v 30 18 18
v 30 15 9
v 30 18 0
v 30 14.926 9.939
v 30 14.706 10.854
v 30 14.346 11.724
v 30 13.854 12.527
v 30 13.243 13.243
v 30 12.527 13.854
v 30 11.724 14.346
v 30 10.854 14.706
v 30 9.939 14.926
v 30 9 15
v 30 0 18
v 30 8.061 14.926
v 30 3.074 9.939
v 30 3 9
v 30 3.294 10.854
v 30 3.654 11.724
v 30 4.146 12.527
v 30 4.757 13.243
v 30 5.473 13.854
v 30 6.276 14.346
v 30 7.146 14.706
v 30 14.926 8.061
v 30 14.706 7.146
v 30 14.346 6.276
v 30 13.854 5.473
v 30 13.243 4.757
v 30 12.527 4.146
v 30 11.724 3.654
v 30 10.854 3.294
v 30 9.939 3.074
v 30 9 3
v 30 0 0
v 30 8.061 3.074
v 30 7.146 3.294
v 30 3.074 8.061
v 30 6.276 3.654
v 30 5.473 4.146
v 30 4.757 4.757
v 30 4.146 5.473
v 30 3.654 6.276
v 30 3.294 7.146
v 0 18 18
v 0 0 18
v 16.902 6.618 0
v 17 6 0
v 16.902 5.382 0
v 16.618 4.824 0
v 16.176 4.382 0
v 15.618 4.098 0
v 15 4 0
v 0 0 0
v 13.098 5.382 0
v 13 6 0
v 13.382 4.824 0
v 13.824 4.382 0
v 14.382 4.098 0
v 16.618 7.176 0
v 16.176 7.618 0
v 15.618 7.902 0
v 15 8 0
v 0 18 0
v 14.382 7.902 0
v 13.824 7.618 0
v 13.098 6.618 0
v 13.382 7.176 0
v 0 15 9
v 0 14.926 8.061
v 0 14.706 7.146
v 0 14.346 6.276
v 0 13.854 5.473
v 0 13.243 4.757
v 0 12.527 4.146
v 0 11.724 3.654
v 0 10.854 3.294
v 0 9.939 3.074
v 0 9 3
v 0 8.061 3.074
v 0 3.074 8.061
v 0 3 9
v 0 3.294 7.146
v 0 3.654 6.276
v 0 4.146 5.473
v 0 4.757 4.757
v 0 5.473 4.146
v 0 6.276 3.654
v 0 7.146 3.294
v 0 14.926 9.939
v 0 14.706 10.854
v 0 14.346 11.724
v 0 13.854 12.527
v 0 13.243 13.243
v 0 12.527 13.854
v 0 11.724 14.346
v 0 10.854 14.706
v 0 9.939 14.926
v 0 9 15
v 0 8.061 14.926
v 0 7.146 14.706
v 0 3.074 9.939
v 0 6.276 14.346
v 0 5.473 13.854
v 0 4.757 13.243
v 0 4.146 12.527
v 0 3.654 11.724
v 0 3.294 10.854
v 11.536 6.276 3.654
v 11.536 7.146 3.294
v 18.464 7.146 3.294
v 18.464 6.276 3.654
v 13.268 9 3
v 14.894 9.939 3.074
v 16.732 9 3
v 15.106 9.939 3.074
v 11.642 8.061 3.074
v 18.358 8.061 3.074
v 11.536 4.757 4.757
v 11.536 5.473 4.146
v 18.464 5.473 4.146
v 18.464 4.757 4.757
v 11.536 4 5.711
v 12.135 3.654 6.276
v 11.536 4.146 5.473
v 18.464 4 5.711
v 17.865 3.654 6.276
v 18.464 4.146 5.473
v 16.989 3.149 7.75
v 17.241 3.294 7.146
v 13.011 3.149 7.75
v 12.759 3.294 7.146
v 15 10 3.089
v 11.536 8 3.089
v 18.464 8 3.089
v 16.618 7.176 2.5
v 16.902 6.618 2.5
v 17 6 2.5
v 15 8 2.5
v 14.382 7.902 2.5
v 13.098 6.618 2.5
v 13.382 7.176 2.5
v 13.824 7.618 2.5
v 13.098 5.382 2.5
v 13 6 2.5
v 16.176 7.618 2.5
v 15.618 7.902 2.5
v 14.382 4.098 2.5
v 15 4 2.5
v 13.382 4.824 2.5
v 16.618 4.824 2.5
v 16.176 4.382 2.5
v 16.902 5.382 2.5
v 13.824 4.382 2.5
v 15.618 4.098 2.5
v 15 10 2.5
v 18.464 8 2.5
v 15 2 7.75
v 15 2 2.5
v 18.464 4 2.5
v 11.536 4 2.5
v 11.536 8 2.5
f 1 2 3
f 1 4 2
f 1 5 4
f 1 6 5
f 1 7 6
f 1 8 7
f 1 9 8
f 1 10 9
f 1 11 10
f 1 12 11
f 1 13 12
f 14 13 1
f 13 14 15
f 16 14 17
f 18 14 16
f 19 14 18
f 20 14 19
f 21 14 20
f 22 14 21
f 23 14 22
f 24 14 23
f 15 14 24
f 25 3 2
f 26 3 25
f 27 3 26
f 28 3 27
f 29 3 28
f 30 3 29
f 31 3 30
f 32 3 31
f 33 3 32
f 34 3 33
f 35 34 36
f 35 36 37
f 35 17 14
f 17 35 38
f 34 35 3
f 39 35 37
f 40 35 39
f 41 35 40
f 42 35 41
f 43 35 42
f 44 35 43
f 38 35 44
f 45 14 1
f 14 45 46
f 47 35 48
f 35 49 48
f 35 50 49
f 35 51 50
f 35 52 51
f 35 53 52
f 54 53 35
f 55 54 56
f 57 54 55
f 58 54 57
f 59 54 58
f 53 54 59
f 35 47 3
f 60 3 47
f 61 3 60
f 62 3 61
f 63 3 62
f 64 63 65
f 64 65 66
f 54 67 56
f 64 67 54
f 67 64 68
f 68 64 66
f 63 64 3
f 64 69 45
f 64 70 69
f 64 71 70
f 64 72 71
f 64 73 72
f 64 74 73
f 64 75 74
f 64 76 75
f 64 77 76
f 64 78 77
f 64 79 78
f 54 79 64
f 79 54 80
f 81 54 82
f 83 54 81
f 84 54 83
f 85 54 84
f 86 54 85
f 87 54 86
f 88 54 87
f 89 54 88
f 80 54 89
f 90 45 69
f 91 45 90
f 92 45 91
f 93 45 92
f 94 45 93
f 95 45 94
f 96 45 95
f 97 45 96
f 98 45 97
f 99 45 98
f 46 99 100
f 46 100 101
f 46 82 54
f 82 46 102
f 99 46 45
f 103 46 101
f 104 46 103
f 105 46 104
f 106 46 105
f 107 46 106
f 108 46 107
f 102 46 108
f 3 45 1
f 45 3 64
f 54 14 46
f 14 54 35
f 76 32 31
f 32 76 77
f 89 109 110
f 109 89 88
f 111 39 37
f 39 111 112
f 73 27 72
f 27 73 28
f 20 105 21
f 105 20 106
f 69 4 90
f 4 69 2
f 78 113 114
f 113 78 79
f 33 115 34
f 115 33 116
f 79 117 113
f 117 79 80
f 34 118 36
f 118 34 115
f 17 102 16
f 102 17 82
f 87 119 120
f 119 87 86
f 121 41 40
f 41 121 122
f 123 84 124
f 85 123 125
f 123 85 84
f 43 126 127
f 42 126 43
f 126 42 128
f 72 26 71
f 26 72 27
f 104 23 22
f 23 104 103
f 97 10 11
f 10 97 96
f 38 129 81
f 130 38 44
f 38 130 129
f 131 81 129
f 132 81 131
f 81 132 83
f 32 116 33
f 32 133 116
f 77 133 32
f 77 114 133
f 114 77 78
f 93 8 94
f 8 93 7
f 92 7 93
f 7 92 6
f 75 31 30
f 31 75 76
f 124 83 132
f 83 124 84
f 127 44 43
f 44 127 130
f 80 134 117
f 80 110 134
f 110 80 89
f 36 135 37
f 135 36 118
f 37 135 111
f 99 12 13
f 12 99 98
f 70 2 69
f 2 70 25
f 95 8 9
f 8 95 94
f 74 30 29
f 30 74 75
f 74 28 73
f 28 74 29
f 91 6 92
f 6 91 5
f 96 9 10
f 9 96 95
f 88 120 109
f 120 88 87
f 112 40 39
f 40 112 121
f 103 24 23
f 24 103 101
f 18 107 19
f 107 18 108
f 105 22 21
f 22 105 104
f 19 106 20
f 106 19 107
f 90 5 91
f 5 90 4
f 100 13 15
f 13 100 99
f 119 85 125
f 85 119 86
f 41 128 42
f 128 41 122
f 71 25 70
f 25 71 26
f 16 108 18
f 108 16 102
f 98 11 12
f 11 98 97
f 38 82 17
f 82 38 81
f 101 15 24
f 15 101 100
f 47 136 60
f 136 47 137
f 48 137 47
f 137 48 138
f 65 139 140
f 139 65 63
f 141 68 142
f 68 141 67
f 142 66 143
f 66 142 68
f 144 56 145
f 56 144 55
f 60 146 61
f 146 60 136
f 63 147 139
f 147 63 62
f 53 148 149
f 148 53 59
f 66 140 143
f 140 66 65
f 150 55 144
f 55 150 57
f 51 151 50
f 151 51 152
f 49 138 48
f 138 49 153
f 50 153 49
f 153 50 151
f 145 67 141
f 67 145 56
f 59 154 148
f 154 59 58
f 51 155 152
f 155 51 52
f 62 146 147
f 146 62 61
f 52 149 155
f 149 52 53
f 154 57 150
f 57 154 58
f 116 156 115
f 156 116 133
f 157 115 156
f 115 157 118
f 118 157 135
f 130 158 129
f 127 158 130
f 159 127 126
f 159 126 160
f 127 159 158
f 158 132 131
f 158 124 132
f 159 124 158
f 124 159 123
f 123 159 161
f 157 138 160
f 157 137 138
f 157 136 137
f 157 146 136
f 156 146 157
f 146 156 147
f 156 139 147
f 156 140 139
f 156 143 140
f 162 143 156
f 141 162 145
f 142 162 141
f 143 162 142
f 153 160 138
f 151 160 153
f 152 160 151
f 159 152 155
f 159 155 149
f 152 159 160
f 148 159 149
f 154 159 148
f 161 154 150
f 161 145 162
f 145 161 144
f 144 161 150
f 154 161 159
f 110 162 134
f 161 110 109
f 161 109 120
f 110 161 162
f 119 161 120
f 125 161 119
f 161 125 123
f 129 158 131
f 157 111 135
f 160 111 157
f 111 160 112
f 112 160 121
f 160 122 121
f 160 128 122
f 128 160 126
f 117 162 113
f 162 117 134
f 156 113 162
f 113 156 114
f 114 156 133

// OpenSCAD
// file: params_basic_components.scad
// Author: Mihai Oltean, www.tcreate.org, mihai.oltean@gmail.com
// More details: jenny5.org
// Source: github.com/jenny5-robot
// MIT License
//--------------------------------------------------------------

spring_length = 20;

smooth_rod_8_radius = 4;
smooth_rod_10_radius = 5;
smooth_rod_12_radius = 6;

tolerance = 0.1;
display_tolerance = 1;

overlap_tolerance = 0.01;

wall_thick_1 = 1;
wall_thick_2 = 2;
wall_thick_3 = 3;
wall_thick_4 = 4;
wall_thick_5 = 5;
wall_thick_5_5 = 5.5;
wall_thick_6 = 6;
wall_thick_7 = 7;
wall_thick_8 = 8;
wall_thick_9 = 9;
wall_thick_10 = 10;
wall_thick_12 = 10;

tolerance_z = [0, 0, tolerance];
tolerance_x = [tolerance, 0, 0];
tolerance_y = [0, tolerance, 0];

display_tolerance_z = [0, 0, display_tolerance];
display_tolerance_x = [display_tolerance, 0, 0];
display_tolerance_y = [0, display_tolerance, 0];

display_tolerance_xz = [display_tolerance, 0, display_tolerance];
display_tolerance_xy = [display_tolerance, display_tolerance, 0];
display_tolerance_yz = [0, display_tolerance, display_tolerance];

display_tolerance_xyz = [display_tolerance, display_tolerance, display_tolerance];
// file: params_screws_nuts_washers.scad
// Author: Mihai Oltean, www.tcreate.org, mihai.oltean@gmail.com
// More details: jenny5.org
// Source: github.com/jenny5-robot
// MIT License
//--------------------------------------------------------------


m2_screw_radius = 1;
m2_nut_radius = 2.2;
m2_nut_height = 1.6;
m2_nut_thick = m2_nut_height;

m3_screw_radius = 1.5;
m3_nut_radius = 3.1;
m3_nut_height = 2.3;
m3_nut_thick = m3_nut_height;
m3_autolock_nut_thick = 4.2;

m4_screw_radius = 2;
m4_nut_radius = 4;
m4_auto_lock_nut_height = 5;
m4_nut_height = 3.25;
m4_nut_thick = 3.25;

m5_screw_radius = 2.5;
m5_nut_radius = 4.6;
m5_nut_height = 4;

m6_screw_radius = 3;
m6_nut_radius = 5.65;
m6_nut_thick = 5;
m6_nut_slim_thick = 3;
m6_autolock_nut_thick = 6;
m6_long_nut_thick = 9;

m8_screw_head_height = 5.7;
m8_screw_radius = 3.9;
m8_nut_small_width = 12.8;
m8_nut_radius = 7.3;
m8_slim_nut_small_width = 12.4;
m8_nut_thick = 6.5;
m8_nut_height = m8_nut_thick;
m8_slim_nut_height = 5.5;
m8_screw_head_radius = 6.5;
m8_autolock_nut_thick = 8;

m10_screw_radius = 5;
m10_nut_thick = 8;
m10_nut_radius = 9.8;

M12_screw_radius = 6;
M12_nut_thick = 10;
M12_nut_radius = 11;
M12_long_long_nut_thick = 36;
M12_long_nut_thick = 36;
M12_autolock_nut_thick = 14;

m10_long_nut_radius = 9.71;
m10_long_nut_height = 29.8;

m10_long_thick_nut_radius = 7.41;
m10_long_thick_nut_height = 30.4;

m12_plastic_nut_radius = 10.45;
m12_plastic_nut_height = 23.3;

tr12_3_nut_radius = 11;
tr12_3_nut_height = 18.1;

washer_5 = 0.97;

washer_4_12_radius = 6;
washer_4_12_external_radius = 6;
washer_4_12_thick = 1;
washer_4_thick = 1;
washer_4_12_internal_radius = 2.15;

washer_4_9_external_radius = 4.5;
washer_4_9_internal_radius = 2.15;
washer_4_9_thick = 1;

washer_6_thick = 1.7;
washer_8_thick = 1.5;
washer_5_thick = 1;

washer_10_height = 2;
washer_10_thick = 2;

washer_12_thick = 2;

washer_5_15_external_radius = 7.5;
washer_5_15_thick = 1;
washer_5_thick = 1;
washer_5_15_internal_radius = 2.65;
// main file
// Author: Mihai Oltean, www.tcreate.org, mihai.oltean@gmail.com
// More details: jenny5.org
// Source: github.com/jenny5-robot
// MIT License
//--------------------------------------------------------------

include <params_screws_nuts_washers.scad>
include <params_basic_components.scad>


//---------------------------------------------------------------------------
module potentiometer_support(length, width, height, dist_to_hole = 10, hole_tolerance = 5, wall_thick = 2)
{
  difference(){
    cube([length, width, height]);
      
    translate ([2, wall_thick, 2])  cube([length, width - 2 * wall_thick, height + 1]);
    //translate ([wall_thick, wall_thick, -1])  cube([length, width - 2 * wall_thick, bottom_wall + 1]);
    translate ([2, 0, height] - display_tolerance_y)  rotate ([0, atan((height - 2) / (length - wall_thick)), 0]) cube([length + sqrt(length), width + 2 * display_tolerance, height + 1]);
    
      // potentiometer hole
    hull(){
       translate ([2 + dist_to_hole, width / 2, 0] - display_tolerance_z) cylinder (h = 5, r = 4.9, $fn = 40);
       translate ([2 + dist_to_hole + hole_tolerance, width / 2, 0] - display_tolerance_z) cylinder (h = 5, r = 4.9, $fn = 40);
    }
  }
}
//---------------------------------------------------------------------------
module potentiometer_support_squared(length, width, height, dist_to_hole = 8, hole_tolerance = 5, wall_thick = 2, pot_width = 16, stopper_shift = 0.9)
{
  difference(){
    union(){
      difference(){
        cube([length, width, height]);
        translate ([2, wall_thick, 2])  cube([length, width - 2 * wall_thick, height + 1]);
        translate ([2, 0, height] - display_tolerance_y)  rotate ([0, atan((height - 2) / (length - wall_thick)), 0]) cube([length + sqrt(length), width + 2 * display_tolerance, height + 1]);
      }
        // stopper for potentiometer
      translate ([0, width / 2 - pot_width / 2 - 2 - stopper_shift, 0]) cube([length, pot_width + 4, 4]);
    }
    // potentiometer slide hole
    translate ([2, width / 2 - pot_width / 2 - stopper_shift, 2]) cube([length, pot_width, height]);
      // potentiometer screw hole
    hull(){
       translate ([2 + dist_to_hole, width / 2, 0] - display_tolerance_z) cylinder (h = 5, r = 5, $fn = 40);
       translate ([2 + dist_to_hole + hole_tolerance, width / 2, 0] - display_tolerance_z) cylinder (h = 5, r = 5, $fn = 40);
    }
  }
}
//---------------------------------------------------------------------------
module potentiometer_support_with_screw_holes(length, width, height, dist_between_support_holes, dist_to_support_holes = 5)
{
    difference(){
      potentiometer_support(length, width, height);
        translate ([0, width / 2 - dist_between_support_holes / 2, 2 + dist_to_support_holes] - display_tolerance_x) rotate([0, 90, 0]) cylinder (h = 2 + 2 * display_tolerance, r = m4_screw_radius, $fn = 20);
        translate ([0, width / 2 + dist_between_support_holes / 2, 2 + dist_to_support_holes] - display_tolerance_x) rotate([0, 90, 0]) cylinder (h = 2 + 2 * display_tolerance, r = m4_screw_radius, $fn = 20);
    }
}
//---------------------------------------------------------------------------
module potentiometer_support_squared_with_screw_holes(length, width, height, dist_between_support_holes, dist_to_support_holes = 5, stopper_shift = 0)
{
    difference(){
      potentiometer_support_squared(length, width, height, pot_width = 17.5, stopper_shift = 0.9);
        translate ([0, width / 2 - dist_between_support_holes / 2, 2 + dist_to_support_holes] - display_tolerance_x) rotate([0, 90, 0]) cylinder (h = 2 + 2 * display_tolerance, r = m4_screw_radius, $fn = 20);
        translate ([0, width / 2 + dist_between_support_holes / 2, 2 + dist_to_support_holes] - display_tolerance_x) rotate([0, 90, 0]) cylinder (h = 2 + 2 * display_tolerance, r = m4_screw_radius, $fn = 20);
    }
}
//---------------------------------------------------------------------------
module rectangular_axis_slider(height, wall_thick = 3, hole_depth = 10.5, hole_width = 10.5)
{
    width = 2 * wall_thick + hole_width + 4;
    
            difference(){
              cube([height, width, hole_depth + 2 * wall_thick - 0.5]);
              translate([0, wall_thick, 3.5] - display_tolerance_x) cube([height + 2 * display_tolerance, hole_width, hole_depth]); 
              translate([height / 2 - 4, wall_thick, 3.5]) cube([8, hole_width, hole_depth + wall_thick] + display_tolerance_z); 
                
             // screw hole   
              translate([height / 2, width, wall_thick + hole_depth / 2]) rotate ([90, 0, 0]) cylinder (h = 10, r = m4_screw_radius, $fn = 20);
                // nut hole
                translate([height / 2, width - 3, wall_thick + hole_depth / 2]) rotate ([90, 30, 0]) cylinder (h = 10, r = m4_nut_radius, $fn = 6);
            }
}
//---------------------------------------------------------------------------
module rounded_axis_slider(height, wall_thick = 3, hole_radius = 6)
{
  width = 2 * wall_thick + 2 * hole_radius;
    
  difference(){
    cube([height, width, width]);
        // shaft hole
    translate([0, wall_thick + hole_radius, wall_thick + hole_radius] - display_tolerance_x) rotate ([0, 90, 0]) cylinder( h = height + 2 * display_tolerance, r = hole_radius, $fn = 40); 
                
    // screw hole   
    translate([height / 2, hole_radius, 0] - display_tolerance_z) cylinder (h = wall_thick + 2, r = m4_screw_radius, $fn = 20);
    // nut hole
      hull(){
    //translate([height / 2, width, 3]) rotate([0, 0, 30]) cylinder (h = m4_nut_thick, r = m4_nut_radius, $fn = 6);
    translate([height / 2, hole_radius, 2.5]) rotate([0, 0, 30]) cylinder (h = m4_nut_thick + 2, r = m4_nut_radius, $fn = 6);
      }
  }
}
//---------------------------------------------------------------------------
module potentiometer_support_on_rectangular_axis(length, width, potentiometer_height, box_height, vertical_distance_to_potentiometer = 0, _stopper_shift = -0.9)
{
    hole_depth = 11.5;
    hole_width = 10.5;
    union(){
        // potentiometer
      translate ([0, 0, vertical_distance_to_potentiometer]) potentiometer_support_squared(length, width, potentiometer_height, pot_width = 18, stopper_shift = _stopper_shift);
      // bone housing
      translate ([-(hole_depth + 6), 0, 0]) 
        difference(){
          cube([hole_depth + 8, width, box_height]);
          translate([6, 0, 2] - display_tolerance_y) cube([hole_depth, width + 2 * display_tolerance, hole_width]); 
          translate([6, 5, 2]) cube([hole_depth, width -10, 20]); 
                
          // screw hole
          translate([0, width / 2, 9] - display_tolerance_x) rotate ([0, 90, 0]) cylinder (h = 10, r = m4_screw_radius, $fn = 20);
          // nut hole
          translate([6 - m4_nut_thick, width / 2, 9] - display_tolerance_x) rotate ([0, 90, 0]) cylinder (h = 5, r = m4_nut_radius, $fn = 6);
        }
    }
}
//---------------------------------------------------------------------------
//potentiometer_support(length = 40, width = 20, height = 4, dist_to_hole = 10, hole_tolerance = 15, wall_thick = 2)

//potentiometer_support_with_screw_holes(25, 48, 13, 29);

//potentiometer_support_on_rectangular_axis(length = 25, width = 23.3, potentiometer_height = 4, box_height = 15, vertical_distance_to_potentiometer = 4, stopper_shift = -0.9);

//rectangular_axis_slider(20);

rounded_axis_slider(height = 30, wall_thick = 3, hole_depth = 10.5, hole_width = 10.5);

//potentiometer_support(27, 28, 5, 10, 5, 3, 0);

//potentiometer_support_squared(length = 27, width = 28, height = 5, dist_to_hole = 10, hole_tolerance = 15, wall_thick = 3, pot_width = 16, stopper_shift = 0.0);

//potentiometer_support_squared_with_screw_holes(25, 48, 13, 30);
